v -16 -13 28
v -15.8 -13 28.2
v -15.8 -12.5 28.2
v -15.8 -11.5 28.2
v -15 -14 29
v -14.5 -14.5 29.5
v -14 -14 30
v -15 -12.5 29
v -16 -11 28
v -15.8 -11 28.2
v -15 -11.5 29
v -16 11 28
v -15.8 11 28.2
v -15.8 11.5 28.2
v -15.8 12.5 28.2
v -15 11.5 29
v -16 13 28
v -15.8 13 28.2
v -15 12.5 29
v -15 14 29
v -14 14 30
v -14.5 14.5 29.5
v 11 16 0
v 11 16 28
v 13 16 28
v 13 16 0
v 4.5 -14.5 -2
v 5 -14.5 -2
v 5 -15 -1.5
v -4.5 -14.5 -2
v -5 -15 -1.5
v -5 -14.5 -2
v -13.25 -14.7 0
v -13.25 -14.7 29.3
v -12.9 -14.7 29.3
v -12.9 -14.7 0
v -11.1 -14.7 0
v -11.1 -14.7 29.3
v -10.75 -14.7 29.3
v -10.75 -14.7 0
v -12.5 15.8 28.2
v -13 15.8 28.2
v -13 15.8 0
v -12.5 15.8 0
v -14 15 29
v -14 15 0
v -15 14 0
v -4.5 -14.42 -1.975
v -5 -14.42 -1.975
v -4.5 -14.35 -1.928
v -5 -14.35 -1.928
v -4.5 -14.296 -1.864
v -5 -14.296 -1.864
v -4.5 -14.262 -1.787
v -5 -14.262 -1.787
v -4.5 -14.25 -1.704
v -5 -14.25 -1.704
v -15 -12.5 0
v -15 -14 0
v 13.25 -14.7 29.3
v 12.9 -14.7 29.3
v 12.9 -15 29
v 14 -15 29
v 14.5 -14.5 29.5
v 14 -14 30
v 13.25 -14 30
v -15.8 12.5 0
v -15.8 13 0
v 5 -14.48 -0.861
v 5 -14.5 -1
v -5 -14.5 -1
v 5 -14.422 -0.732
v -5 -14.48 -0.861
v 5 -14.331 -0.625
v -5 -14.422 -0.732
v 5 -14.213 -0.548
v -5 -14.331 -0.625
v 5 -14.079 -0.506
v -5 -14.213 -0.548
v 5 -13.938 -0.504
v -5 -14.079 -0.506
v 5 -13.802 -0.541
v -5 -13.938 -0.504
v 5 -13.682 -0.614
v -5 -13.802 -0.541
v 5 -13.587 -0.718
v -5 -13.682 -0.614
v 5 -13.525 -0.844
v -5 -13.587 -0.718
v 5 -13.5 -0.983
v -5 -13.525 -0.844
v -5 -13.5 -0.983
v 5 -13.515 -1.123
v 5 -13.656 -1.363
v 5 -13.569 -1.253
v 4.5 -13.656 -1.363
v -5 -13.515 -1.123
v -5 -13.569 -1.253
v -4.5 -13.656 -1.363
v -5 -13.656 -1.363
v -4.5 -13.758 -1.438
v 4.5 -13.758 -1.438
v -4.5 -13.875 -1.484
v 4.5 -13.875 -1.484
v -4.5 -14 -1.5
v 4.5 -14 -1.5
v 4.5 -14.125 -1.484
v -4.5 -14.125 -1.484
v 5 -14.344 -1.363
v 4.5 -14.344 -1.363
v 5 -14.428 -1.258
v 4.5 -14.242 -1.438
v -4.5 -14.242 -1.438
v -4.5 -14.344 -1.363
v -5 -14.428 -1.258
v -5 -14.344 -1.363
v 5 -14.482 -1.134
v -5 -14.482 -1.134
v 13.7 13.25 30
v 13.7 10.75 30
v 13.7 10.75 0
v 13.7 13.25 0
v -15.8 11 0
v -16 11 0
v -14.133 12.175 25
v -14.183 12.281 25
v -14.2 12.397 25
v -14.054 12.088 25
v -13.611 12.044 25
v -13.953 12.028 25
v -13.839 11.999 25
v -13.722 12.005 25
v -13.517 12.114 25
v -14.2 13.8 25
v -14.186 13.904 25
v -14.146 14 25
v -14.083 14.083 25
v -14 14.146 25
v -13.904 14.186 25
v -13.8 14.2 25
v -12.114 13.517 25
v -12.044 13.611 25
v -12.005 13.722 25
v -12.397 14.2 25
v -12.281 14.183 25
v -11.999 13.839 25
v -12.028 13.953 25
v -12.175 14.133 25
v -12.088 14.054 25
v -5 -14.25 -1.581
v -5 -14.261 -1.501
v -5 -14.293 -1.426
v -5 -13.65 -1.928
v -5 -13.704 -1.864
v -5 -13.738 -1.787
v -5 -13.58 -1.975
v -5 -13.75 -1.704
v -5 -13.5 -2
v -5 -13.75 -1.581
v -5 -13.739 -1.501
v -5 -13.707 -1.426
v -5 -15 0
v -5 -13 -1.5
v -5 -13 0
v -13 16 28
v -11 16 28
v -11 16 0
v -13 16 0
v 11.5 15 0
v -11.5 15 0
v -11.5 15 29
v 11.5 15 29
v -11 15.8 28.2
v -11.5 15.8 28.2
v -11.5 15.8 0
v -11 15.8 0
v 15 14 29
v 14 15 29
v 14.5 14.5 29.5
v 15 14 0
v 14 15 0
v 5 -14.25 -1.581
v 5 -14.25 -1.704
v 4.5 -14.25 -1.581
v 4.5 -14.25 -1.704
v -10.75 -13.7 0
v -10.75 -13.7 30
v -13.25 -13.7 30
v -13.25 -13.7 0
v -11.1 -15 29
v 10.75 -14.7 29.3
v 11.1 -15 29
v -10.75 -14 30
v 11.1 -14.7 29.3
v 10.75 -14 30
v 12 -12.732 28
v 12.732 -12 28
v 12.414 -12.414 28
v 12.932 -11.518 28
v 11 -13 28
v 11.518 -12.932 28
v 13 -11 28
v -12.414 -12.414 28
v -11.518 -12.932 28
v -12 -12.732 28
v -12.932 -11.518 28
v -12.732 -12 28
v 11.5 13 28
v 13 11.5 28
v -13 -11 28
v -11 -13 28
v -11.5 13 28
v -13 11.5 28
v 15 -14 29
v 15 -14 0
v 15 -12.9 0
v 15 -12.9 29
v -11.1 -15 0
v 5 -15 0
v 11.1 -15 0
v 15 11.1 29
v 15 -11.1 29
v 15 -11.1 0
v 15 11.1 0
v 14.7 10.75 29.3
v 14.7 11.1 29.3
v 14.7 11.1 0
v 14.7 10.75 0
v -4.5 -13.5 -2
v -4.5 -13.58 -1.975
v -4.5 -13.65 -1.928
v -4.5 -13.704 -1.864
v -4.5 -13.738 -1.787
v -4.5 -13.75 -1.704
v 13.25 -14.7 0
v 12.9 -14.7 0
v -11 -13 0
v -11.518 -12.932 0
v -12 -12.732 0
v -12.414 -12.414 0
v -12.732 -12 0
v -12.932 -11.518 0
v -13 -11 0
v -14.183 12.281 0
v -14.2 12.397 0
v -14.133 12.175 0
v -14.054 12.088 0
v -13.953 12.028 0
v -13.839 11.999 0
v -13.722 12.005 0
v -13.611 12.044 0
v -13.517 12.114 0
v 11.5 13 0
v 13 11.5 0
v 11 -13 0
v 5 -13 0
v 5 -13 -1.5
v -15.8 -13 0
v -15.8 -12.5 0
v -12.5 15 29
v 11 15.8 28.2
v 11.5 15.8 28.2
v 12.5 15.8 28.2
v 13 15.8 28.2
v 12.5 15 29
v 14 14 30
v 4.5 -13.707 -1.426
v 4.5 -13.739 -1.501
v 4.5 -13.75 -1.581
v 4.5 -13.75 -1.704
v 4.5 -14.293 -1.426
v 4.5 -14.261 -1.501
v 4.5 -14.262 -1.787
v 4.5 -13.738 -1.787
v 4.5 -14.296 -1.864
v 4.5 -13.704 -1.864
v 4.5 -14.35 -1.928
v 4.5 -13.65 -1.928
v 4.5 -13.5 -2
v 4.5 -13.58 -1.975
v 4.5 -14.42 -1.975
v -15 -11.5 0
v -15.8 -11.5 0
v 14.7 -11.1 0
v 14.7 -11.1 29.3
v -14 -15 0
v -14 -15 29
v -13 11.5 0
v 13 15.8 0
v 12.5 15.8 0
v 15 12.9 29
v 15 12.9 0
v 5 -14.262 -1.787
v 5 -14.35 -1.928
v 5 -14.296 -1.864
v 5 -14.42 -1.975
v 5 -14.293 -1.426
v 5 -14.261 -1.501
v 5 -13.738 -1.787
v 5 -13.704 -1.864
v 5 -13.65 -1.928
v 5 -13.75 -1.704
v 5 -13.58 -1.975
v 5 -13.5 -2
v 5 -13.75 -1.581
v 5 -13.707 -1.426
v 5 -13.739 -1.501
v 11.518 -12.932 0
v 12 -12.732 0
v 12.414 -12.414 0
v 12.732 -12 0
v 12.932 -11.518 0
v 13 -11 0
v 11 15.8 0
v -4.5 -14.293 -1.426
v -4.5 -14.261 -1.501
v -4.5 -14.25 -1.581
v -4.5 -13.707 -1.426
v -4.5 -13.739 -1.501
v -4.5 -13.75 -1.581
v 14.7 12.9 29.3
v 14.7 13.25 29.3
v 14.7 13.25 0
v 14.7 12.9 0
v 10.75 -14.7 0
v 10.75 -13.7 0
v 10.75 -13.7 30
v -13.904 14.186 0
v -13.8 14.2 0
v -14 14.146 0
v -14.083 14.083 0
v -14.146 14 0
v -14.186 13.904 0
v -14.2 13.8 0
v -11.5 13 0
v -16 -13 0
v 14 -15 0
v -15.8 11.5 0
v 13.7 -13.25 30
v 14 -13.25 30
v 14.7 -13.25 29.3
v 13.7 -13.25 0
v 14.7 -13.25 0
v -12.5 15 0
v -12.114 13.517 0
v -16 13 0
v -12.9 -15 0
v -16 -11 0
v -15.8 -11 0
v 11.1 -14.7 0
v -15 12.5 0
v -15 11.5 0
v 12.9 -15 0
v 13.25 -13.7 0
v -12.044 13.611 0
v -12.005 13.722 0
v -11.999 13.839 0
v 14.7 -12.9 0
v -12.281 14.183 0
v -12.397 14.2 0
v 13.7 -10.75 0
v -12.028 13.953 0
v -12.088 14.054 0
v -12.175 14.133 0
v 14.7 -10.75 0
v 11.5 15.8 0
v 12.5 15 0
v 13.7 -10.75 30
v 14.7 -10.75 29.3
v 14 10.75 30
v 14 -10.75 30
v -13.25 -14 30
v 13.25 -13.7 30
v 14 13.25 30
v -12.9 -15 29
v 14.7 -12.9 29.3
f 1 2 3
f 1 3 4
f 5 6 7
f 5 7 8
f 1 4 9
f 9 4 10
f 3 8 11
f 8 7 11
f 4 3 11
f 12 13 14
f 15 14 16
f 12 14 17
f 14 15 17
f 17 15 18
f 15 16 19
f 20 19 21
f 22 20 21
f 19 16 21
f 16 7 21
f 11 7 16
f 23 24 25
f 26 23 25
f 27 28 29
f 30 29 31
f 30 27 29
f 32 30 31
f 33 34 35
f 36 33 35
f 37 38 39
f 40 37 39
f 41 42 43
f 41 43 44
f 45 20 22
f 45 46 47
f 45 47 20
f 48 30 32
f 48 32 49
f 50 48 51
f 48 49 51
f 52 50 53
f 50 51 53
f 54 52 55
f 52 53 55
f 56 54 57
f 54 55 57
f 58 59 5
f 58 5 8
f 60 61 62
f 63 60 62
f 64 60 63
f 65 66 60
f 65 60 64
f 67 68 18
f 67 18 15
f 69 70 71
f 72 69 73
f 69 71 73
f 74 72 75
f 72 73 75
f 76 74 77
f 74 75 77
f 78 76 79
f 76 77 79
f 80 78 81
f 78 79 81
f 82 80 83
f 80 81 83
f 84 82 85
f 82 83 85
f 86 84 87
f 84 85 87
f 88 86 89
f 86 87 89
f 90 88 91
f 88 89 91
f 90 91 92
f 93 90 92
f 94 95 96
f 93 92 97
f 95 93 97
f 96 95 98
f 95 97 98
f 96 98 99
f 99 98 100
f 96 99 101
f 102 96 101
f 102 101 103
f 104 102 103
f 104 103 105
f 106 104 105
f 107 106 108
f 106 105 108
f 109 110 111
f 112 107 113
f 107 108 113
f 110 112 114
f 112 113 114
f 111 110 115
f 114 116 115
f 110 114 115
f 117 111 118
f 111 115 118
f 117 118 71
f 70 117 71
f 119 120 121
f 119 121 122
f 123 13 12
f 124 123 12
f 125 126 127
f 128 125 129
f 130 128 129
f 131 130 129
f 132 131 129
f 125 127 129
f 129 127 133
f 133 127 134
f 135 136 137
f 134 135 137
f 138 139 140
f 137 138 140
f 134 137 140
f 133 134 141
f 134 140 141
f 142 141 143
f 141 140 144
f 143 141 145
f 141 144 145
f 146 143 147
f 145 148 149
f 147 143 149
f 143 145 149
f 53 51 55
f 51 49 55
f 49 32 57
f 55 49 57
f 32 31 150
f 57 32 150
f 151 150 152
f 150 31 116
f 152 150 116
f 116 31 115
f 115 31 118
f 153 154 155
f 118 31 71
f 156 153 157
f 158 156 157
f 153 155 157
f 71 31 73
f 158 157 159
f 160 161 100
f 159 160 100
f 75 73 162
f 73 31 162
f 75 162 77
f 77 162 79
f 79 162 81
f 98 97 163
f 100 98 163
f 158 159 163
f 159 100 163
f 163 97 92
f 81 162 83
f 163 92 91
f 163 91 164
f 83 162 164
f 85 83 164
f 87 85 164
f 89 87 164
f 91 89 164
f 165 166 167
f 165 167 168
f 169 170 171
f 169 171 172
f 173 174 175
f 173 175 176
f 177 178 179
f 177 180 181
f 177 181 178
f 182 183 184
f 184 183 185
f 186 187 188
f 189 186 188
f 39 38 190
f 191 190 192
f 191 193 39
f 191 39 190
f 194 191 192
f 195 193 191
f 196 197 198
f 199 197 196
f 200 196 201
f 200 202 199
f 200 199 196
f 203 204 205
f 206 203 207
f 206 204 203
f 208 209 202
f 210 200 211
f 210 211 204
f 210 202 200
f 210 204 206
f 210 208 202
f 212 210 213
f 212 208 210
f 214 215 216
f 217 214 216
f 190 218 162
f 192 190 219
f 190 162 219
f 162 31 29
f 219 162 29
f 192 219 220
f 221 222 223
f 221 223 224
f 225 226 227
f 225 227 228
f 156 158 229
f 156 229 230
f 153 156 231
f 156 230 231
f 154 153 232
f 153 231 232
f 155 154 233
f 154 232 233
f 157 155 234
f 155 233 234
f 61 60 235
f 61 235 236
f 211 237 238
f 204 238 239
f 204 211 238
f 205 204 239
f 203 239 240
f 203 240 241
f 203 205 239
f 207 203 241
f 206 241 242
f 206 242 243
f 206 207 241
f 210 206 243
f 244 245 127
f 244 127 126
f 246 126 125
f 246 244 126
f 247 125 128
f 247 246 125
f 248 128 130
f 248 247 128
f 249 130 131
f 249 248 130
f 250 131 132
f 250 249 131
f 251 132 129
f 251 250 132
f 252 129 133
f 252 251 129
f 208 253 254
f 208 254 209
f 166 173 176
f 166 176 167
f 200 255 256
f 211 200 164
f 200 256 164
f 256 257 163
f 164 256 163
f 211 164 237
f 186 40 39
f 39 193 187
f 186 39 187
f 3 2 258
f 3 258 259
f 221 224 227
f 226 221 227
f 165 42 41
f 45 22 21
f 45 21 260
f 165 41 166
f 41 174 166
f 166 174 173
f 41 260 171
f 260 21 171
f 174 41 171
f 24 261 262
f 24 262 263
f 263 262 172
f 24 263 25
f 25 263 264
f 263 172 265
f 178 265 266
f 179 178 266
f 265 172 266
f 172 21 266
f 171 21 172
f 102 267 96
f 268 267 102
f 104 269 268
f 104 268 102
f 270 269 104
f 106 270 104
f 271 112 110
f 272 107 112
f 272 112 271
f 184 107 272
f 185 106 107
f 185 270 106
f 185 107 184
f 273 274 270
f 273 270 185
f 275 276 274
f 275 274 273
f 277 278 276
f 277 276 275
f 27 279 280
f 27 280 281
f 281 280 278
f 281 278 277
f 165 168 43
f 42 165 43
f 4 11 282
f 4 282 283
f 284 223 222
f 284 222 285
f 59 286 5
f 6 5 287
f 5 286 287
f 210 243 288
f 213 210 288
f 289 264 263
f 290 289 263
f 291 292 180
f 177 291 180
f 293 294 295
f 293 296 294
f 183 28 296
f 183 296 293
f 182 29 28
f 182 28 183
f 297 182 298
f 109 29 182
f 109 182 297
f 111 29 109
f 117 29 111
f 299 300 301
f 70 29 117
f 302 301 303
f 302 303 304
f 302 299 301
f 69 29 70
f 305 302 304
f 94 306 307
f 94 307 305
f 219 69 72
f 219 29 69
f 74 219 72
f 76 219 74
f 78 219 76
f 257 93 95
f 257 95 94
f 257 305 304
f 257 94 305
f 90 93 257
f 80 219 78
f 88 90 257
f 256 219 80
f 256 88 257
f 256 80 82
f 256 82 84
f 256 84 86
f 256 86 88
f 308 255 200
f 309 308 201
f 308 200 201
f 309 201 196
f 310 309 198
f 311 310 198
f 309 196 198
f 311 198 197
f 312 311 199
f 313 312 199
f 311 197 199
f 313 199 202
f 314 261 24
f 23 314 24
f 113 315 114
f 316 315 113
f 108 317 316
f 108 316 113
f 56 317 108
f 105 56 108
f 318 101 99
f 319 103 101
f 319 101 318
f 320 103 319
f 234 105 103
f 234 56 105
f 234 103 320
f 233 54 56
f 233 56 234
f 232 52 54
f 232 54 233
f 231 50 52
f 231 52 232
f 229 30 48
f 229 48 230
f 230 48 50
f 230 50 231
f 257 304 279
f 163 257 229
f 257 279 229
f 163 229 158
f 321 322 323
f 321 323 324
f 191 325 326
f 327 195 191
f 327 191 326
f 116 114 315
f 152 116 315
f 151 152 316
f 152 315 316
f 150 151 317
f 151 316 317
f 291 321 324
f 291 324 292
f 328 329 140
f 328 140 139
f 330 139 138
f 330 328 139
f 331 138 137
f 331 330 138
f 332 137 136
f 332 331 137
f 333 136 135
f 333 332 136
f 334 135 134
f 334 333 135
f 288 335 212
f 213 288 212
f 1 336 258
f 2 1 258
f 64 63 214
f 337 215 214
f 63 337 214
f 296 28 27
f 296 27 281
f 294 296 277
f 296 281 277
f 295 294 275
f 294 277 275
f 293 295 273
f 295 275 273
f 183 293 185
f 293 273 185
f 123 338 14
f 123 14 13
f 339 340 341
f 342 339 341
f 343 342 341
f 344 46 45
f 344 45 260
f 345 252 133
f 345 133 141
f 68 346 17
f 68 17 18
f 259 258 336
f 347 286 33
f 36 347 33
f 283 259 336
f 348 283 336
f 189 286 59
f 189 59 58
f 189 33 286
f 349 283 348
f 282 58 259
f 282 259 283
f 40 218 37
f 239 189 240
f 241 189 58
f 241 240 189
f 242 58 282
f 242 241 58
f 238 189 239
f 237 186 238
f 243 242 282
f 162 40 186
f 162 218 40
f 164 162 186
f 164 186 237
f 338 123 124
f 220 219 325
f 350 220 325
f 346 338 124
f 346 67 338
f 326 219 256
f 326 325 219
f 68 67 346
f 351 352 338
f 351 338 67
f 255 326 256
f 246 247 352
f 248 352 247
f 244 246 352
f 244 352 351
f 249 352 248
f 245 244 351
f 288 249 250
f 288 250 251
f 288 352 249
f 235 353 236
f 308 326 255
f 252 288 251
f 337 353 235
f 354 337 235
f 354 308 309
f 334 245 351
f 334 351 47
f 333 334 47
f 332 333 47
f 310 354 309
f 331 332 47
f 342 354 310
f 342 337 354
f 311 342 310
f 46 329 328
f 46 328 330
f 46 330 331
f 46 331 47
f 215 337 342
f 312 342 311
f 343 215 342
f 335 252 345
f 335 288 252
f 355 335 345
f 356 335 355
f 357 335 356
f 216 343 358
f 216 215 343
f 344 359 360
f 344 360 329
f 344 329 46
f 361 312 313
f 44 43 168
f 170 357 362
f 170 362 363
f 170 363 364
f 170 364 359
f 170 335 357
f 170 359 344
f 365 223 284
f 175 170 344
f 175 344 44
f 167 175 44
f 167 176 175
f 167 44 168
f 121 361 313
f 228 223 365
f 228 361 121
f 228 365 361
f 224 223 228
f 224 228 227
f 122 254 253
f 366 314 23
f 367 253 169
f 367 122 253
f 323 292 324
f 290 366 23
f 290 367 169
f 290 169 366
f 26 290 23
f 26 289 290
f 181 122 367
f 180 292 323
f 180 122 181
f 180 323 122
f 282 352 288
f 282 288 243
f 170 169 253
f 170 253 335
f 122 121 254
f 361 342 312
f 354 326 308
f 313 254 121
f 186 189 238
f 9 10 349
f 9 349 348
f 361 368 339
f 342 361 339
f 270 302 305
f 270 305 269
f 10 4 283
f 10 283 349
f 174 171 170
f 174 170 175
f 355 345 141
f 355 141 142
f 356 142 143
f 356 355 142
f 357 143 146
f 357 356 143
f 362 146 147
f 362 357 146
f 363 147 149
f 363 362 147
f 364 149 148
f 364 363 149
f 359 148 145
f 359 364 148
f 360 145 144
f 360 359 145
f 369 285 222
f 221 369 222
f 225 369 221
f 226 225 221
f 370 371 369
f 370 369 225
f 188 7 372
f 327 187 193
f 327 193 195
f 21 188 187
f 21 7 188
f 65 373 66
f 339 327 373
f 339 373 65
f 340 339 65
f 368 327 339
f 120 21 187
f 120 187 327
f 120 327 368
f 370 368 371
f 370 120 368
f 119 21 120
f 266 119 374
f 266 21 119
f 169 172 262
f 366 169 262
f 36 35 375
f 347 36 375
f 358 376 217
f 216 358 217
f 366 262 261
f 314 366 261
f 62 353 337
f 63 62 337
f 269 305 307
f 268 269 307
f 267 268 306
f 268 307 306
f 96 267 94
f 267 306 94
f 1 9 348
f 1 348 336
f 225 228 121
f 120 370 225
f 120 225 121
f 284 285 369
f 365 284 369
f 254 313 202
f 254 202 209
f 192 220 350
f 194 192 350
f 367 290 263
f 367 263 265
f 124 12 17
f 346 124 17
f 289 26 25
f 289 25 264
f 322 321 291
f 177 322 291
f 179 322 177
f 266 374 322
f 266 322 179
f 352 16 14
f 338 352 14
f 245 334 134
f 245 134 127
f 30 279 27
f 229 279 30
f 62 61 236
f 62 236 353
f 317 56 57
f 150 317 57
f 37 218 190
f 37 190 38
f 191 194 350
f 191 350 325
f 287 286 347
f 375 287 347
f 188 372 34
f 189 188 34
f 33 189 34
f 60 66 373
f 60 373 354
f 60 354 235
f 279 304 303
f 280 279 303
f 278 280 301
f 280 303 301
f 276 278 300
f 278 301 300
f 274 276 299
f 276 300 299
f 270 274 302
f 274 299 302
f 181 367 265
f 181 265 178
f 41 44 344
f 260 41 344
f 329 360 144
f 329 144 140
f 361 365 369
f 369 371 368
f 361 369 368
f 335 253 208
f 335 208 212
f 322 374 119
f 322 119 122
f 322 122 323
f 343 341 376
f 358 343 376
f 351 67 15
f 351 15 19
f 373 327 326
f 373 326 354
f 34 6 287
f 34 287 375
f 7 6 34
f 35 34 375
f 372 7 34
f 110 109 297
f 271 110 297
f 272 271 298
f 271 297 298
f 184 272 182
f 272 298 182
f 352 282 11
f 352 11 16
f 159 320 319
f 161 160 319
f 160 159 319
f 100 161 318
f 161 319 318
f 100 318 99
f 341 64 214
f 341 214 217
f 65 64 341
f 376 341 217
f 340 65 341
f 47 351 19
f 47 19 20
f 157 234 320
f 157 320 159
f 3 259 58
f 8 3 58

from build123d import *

# Parameters (mm, degrees)
SKETCH_1_W                      = 30
SKETCH_1_H                      = 30
EXTRUDE_1_DEPTH                 = 30
CHAMFER_6_SIZE                  = 1
EXTRUDE_3_DEPTH                 = 40
PATTERN_CIRCULAR_8_COUNT        = 2
PATTERN_CIRCULAR_8_ANGLE        = 270
PATTERN_CIRCULAR_8_COPY_1_DEPTH = 40
SKETCH_16_W                     = 12.549729198
SKETCH_16_H                     = 35.597789554
CUT_EXTRUDE_8_DEPTH             = 50
SKETCH_17_W                     = 46.119781587
SKETCH_17_H                     = 25.089994046
CUT_EXTRUDE_10_DEPTH            = 50
CUT_EXTRUDE_2_DEPTH             = 30
PATTERN_CIRCULAR_1_COUNT        = 2
PATTERN_CIRCULAR_1_ANGLE        = 270
PATTERN_CIRCULAR_1_COPY_1_DEPTH = 30
CHAMFER_5_SIZE                  = 1
SKETCH_2_W                      = 26
SKETCH_2_H                      = 26
CUT_EXTRUDE_1_DEPTH             = 28
FILLET_1_R                      = 2
CHAMFER_1_SIZE                  = 1.5
CUT_EXTRUDE_3_DEPTH             = 25
SKETCH_12_W                     = 10
SKETCH_12_H                     = 2
EXTRUDE_6_DEPTH                 = 2
SKETCH_13_R                     = 0.5
CUT_EXTRUDE_6_DEPTH             = 40.446165847
SKETCH_14_W                     = 0.5
SKETCH_14_H                     = 0.5
CUT_EXTRUDE_7_DEPTH             = 1
CHAMFER_8_SIZE                  = 0.5
FILLET_6_R                      = 0.3


with BuildPart() as part:
    # 草图1 → 凸台-拉伸1 (new body)
    with BuildSketch(Plane.XY):
        Rectangle(SKETCH_1_W, SKETCH_1_H)
    extrude(amount=EXTRUDE_1_DEPTH)

    # 倒角6
    chamfer_6_edges = [part.edges().sort_by_distance(p)[0] for p in [
        (-15, 0, 30),
        (0, -15, 30),
        (15, 0, 30),
        (0, 15, 30),
    ]]
    chamfer(chamfer_6_edges, length=CHAMFER_6_SIZE)

    # 草图6 → 凸台-拉伸3 (add)
    with BuildSketch(Plane.XY):
        Polygon((-12.5, 15), (-11.5, 15), (-11.5, 15.8), (-11, 15.8), (-11, 16), (-13, 16), (-13, 15.8), (-12.5, 15.8), align=None)
    extrude_3 = extrude(amount=EXTRUDE_3_DEPTH)

    # 镜向4: 凸台-拉伸3 across plane
    add(extrude_3.mirror(Plane(origin=(0, 0, 0), x_dir=(0, 0, 1), z_dir=(1, 0, 0))))

    # 阵列(圆周)8: 凸台-拉伸3 ×2 about axis
    pattern_circular_8_axis = Axis((0, 0, 0), (0, 0, -1))
    for i in range(1, PATTERN_CIRCULAR_8_COUNT):
        add(extrude_3.rotate(pattern_circular_8_axis, i * PATTERN_CIRCULAR_8_ANGLE / (PATTERN_CIRCULAR_8_COUNT - 1)))

    # 阵列(圆周)8 copy 1 sketch → 阵列(圆周)8 copy 1 (add)
    with BuildSketch(Plane(origin=(0, 0, 0), x_dir=(0, -1, 0), z_dir=(0, 0, 1))):
        Polygon((-12.5, -15), (-11.5, -15), (-11.5, -15.8), (-11, -15.8), (-11, -16), (-13, -16), (-13, -15.8), (-12.5, -15.8), align=None)
    extrude(amount=PATTERN_CIRCULAR_8_COPY_1_DEPTH)

    # 草图16 → 切除-拉伸8 (cut, along a direction that is not the sketch's normal)
    with BuildSketch(Plane(origin=(-22, 0, 22), x_dir=(0.7071067811865475, 0, 0.7071067811865477), z_dir=(-0.7071067811865477, 0, 0.7071067811865475))):
        with Locations((10.913675879, 1.48547553)):
            Rectangle(SKETCH_16_W, SKETCH_16_H)
    extrude(amount=CUT_EXTRUDE_8_DEPTH, dir=(0, 0, 1), mode=Mode.SUBTRACT)

    # 草图17 → 切除-拉伸10 (cut, along a direction that is not the sketch's normal)
    with BuildSketch(Plane(origin=(0, 22, 22), x_dir=(1, 0, 0), z_dir=(0, 0.7071067811865477, 0.7071067811865475))):
        with Locations((-2.061617887, -8.781830855)):
            Rectangle(SKETCH_17_W, SKETCH_17_H)
    extrude(amount=CUT_EXTRUDE_10_DEPTH, dir=(0, 0, 1), mode=Mode.SUBTRACT)

    # 草图8 → 切除-拉伸2 (cut)
    with BuildSketch(Plane.XY.offset(30)):
        Polygon((-12.9, -15), (-11.1, -15), (-11.1, -14.7), (-10.75, -14.7), (-10.75, -13.7), (-13.25, -13.7), (-13.25, -14.7), (-12.9, -14.7), align=None)
    cut_extrude_2 = extrude(amount=-CUT_EXTRUDE_2_DEPTH, mode=Mode.SUBTRACT)

    # 镜向1: 切除-拉伸2 across plane
    add(cut_extrude_2.mirror(Plane(origin=(0, 0, 0), x_dir=(0, 0, 1), z_dir=(1, 0, 0))), mode=Mode.SUBTRACT)

    # 阵列(圆周)1: 切除-拉伸2 ×2 about axis
    pattern_circular_1_axis = Axis((0, 0, 0), (0, 0, -1))
    for i in range(1, PATTERN_CIRCULAR_1_COUNT):
        add(cut_extrude_2.rotate(pattern_circular_1_axis, i * PATTERN_CIRCULAR_1_ANGLE / (PATTERN_CIRCULAR_1_COUNT - 1)), mode=Mode.SUBTRACT)

    # 阵列(圆周)1 copy 1 sketch → 阵列(圆周)1 copy 1 (cut)
    with BuildSketch(Plane(origin=(0, 0, 30), x_dir=(0, -1, 0), z_dir=(0, 0, 1))):
        Polygon((-12.9, 15), (-11.1, 15), (-11.1, 14.7), (-10.75, 14.7), (-10.75, 13.7), (-13.25, 13.7), (-13.25, 14.7), (-12.9, 14.7), align=None)
    extrude(amount=-PATTERN_CIRCULAR_1_COPY_1_DEPTH, mode=Mode.SUBTRACT)

    # 倒角5
    chamfer_5_edges = [part.edges().sort_by_distance(p)[0] for p in [
        (15, -15, 14.5),
        (-15, -15, 14.5),
        (15, 15, 14.5),
        (-15, 15, 14.5),
    ]]
    chamfer(chamfer_5_edges, length=CHAMFER_5_SIZE)

    # 草图2 → 切除-拉伸1 (cut)
    with BuildSketch(Plane(origin=(0, 0, 0), x_dir=(-1, 0, 0), z_dir=(0, 0, -1))):
        Rectangle(SKETCH_2_W, SKETCH_2_H)
    extrude(amount=-CUT_EXTRUDE_1_DEPTH, mode=Mode.SUBTRACT)

    # 圆角1
    fillet_1_edges = [part.edges().sort_by_distance(p)[0] for p in [
        (13, -13, 14),
        (-13, -13, 14),
    ]]
    fillet(fillet_1_edges, radius=FILLET_1_R)

    # 倒角1
    chamfer_1_edges = [part.edges().sort_by_distance(p)[0] for p in [
        (13, 13, 14),
        (-13, 13, 14),
    ]]
    chamfer(chamfer_1_edges, length=CHAMFER_1_SIZE)

    # 草图9 → 切除-拉伸3 (cut)
    with BuildSketch(Plane(origin=(0, 0, 0), x_dir=(-1, 0, 0), z_dir=(0, 0, -1))):
        with BuildLine():
            Line((12.397056275, 14.2), (13.8, 14.2))
            ThreePointArc((13.8, 14.2), (14.082842712, 14.082842712), (14.2, 13.8))
            Line((14.2, 13.8), (14.2, 12.397056275))
            ThreePointArc((14.2, 12.397056275), (13.953073373, 12.027504462), (13.517157288, 12.114213562))
            Line((13.517157288, 12.114213562), (12.114213562, 13.517157288))
            ThreePointArc((12.114213562, 13.517157288), (12.027504462, 13.953073373), (12.397056275, 14.2))
        make_face()
    extrude(amount=-CUT_EXTRUDE_3_DEPTH, mode=Mode.SUBTRACT)

    # 草图12 → 凸台-拉伸6 (add)
    with BuildSketch(Plane(origin=(0, 0, 0), x_dir=(-1, 0, 0), z_dir=(0, 0, -1))):
        with Locations((0, -14)):
            Rectangle(SKETCH_12_W, SKETCH_12_H)
    extrude(amount=EXTRUDE_6_DEPTH)

    # 草图13 → 切除-拉伸6 (cut, through all)
    with BuildSketch(Plane.ZY.offset(5)):
        with Locations(Location((-1, -14, 0), (0, 0, 270))):
            Circle(SKETCH_13_R)
    extrude(amount=-CUT_EXTRUDE_6_DEPTH, mode=Mode.SUBTRACT)

    # 草图14 → 切除-拉伸7 (cut)
    with BuildSketch(Plane(origin=(0, 0, -2), x_dir=(-1, 0, 0), z_dir=(0, 0, -1))):
        with Locations((-4.75, -14)):
            Rectangle(SKETCH_14_W, SKETCH_14_H)
        with Locations((4.75, -14)):
            Rectangle(SKETCH_14_W, SKETCH_14_H)
    extrude(amount=-CUT_EXTRUDE_7_DEPTH, mode=Mode.SUBTRACT)

    # 倒角8
    chamfer_8_edges = [part.edges().sort_by_distance(p)[0] for p in [
        (0, -15, -2),
        (0, -13, -2),
    ]]
    chamfer(chamfer_8_edges, length=CHAMFER_8_SIZE)

    # 圆角6
    # the kernel refuses this fillet: 0.3 mm, written as the material it takes off along each edge
    with BuildSketch(Plane(origin=(-4.5, -14.25, -1.433012702), x_dir=(0, -0.8016059252125737, 0.5978527750743438), z_dir=(-1, 0, 0))) as fillet_6_piece_1:
        with BuildLine():
            CenterArc((0.152038547, -0.297941245), FILLET_6_R, 96.716268279, 46.567463442)
            Line((-0.088443231, -0.118585412), (-0.093252866, -0.114998296))
            Line((-0.093252866, -0.114998296), (-0.004809636, 0.003587117))
            Line((-0.004809636, 0.003587117), (0.000701716, 0.005958825))
            ThreePointArc((0.000701716, 0.005958825), (0.058476364, 0.002568741), (0.116251012, 0.005958825))
            Line((0.116251012, 0.005958825), (0.116952728, 0))
        make_face()
    extrude(amount=0.869837, mode=Mode.SUBTRACT)
    with BuildSketch(Plane(origin=(-4.5, -13.75, -1.433012702), x_dir=(0, 0.8016059252125791, 0.5978527750743364), z_dir=(-1, 0, 0)), Plane(origin=(5.369837, -13.75, -1.433012702), x_dir=(0, 0.8016059252125827, 0.5978527750743317), z_dir=(-1, 0, 0))) as fillet_6_piece_2:
        with BuildLine():
            CenterArc((0.152038547, 0.297941245), FILLET_6_R, 216.716268279, 46.567463442)
            Line((-0.088443231, 0.118585412), (-0.093252866, 0.114998296))
            Line((-0.093252866, 0.114998296), (-0.004809636, -0.003587117))
            Line((-0.004809636, -0.003587117), (0.000701716, -0.005958825))
            ThreePointArc((0.000701716, -0.005958825), (0.058476364, -0.002568741), (0.116251012, -0.005958825))
            Line((0.116251012, -0.005958825), (0.116952728, 0))
        make_face()
    extrude(amount=0.869837, mode=Mode.SUBTRACT)
    with BuildSketch(Plane(origin=(-5.739509973, -14.25, -2), x_dir=(0, -1, 0), z_dir=(1, 0, 0)), Plane(origin=(-4.5, -13.75, -2), x_dir=(0, 1, 0), z_dir=(-1, 0, 0)), Plane(origin=(4.5, -14.25, -2), x_dir=(0, -1, 0), z_dir=(1, 0, 0)), Plane(origin=(5.739509973, -13.75, -2), x_dir=(0, 1, 0), z_dir=(-1, 0, 0))) as fillet_6_piece_3:
        with BuildLine():
            CenterArc((0.3, -0.295803989), FILLET_6_R, 99.594068227, 80.405931773)
            Line((0, -0.295803989), (-0.006, -0.295803989))
            Line((-0.006, -0.295803989), (-0.006, 0))
            Line((-0.006, 0), (0, 0.006))
            ThreePointArc((0, 0.006), (0.125, 0.006), (0.249, 0.00591608))
            Line((0.249, 0.00591608), (0.25, 0))
        make_face()
    extrude(amount=1.239509973, mode=Mode.SUBTRACT)
    with BuildSketch(Plane(origin=(5.369837, -14.25, -1.433012702), x_dir=(0, 0, -1), z_dir=(-1, 0, 0))) as fillet_6_piece_4:
        with BuildLine():
            CenterArc((0.1479348, 0.3), FILLET_6_R, 223.432536558, 46.567463442)
            Line((-0.069920513, 0.09375), (-0.074277619, 0.089625))
            ThreePointArc((-0.074277619, 0.089625), (-0.037019375, 0.045339271), (-0.005196152, -0.003))
            Line((-0.005196152, -0.003), (0, -0.006))
            Line((0, -0.006), (0.1479348, -0.006))
            Line((0.1479348, -0.006), (0.1479348, 0))
        make_face()
    extrude(amount=0.869837, mode=Mode.SUBTRACT)


solid = part.part
